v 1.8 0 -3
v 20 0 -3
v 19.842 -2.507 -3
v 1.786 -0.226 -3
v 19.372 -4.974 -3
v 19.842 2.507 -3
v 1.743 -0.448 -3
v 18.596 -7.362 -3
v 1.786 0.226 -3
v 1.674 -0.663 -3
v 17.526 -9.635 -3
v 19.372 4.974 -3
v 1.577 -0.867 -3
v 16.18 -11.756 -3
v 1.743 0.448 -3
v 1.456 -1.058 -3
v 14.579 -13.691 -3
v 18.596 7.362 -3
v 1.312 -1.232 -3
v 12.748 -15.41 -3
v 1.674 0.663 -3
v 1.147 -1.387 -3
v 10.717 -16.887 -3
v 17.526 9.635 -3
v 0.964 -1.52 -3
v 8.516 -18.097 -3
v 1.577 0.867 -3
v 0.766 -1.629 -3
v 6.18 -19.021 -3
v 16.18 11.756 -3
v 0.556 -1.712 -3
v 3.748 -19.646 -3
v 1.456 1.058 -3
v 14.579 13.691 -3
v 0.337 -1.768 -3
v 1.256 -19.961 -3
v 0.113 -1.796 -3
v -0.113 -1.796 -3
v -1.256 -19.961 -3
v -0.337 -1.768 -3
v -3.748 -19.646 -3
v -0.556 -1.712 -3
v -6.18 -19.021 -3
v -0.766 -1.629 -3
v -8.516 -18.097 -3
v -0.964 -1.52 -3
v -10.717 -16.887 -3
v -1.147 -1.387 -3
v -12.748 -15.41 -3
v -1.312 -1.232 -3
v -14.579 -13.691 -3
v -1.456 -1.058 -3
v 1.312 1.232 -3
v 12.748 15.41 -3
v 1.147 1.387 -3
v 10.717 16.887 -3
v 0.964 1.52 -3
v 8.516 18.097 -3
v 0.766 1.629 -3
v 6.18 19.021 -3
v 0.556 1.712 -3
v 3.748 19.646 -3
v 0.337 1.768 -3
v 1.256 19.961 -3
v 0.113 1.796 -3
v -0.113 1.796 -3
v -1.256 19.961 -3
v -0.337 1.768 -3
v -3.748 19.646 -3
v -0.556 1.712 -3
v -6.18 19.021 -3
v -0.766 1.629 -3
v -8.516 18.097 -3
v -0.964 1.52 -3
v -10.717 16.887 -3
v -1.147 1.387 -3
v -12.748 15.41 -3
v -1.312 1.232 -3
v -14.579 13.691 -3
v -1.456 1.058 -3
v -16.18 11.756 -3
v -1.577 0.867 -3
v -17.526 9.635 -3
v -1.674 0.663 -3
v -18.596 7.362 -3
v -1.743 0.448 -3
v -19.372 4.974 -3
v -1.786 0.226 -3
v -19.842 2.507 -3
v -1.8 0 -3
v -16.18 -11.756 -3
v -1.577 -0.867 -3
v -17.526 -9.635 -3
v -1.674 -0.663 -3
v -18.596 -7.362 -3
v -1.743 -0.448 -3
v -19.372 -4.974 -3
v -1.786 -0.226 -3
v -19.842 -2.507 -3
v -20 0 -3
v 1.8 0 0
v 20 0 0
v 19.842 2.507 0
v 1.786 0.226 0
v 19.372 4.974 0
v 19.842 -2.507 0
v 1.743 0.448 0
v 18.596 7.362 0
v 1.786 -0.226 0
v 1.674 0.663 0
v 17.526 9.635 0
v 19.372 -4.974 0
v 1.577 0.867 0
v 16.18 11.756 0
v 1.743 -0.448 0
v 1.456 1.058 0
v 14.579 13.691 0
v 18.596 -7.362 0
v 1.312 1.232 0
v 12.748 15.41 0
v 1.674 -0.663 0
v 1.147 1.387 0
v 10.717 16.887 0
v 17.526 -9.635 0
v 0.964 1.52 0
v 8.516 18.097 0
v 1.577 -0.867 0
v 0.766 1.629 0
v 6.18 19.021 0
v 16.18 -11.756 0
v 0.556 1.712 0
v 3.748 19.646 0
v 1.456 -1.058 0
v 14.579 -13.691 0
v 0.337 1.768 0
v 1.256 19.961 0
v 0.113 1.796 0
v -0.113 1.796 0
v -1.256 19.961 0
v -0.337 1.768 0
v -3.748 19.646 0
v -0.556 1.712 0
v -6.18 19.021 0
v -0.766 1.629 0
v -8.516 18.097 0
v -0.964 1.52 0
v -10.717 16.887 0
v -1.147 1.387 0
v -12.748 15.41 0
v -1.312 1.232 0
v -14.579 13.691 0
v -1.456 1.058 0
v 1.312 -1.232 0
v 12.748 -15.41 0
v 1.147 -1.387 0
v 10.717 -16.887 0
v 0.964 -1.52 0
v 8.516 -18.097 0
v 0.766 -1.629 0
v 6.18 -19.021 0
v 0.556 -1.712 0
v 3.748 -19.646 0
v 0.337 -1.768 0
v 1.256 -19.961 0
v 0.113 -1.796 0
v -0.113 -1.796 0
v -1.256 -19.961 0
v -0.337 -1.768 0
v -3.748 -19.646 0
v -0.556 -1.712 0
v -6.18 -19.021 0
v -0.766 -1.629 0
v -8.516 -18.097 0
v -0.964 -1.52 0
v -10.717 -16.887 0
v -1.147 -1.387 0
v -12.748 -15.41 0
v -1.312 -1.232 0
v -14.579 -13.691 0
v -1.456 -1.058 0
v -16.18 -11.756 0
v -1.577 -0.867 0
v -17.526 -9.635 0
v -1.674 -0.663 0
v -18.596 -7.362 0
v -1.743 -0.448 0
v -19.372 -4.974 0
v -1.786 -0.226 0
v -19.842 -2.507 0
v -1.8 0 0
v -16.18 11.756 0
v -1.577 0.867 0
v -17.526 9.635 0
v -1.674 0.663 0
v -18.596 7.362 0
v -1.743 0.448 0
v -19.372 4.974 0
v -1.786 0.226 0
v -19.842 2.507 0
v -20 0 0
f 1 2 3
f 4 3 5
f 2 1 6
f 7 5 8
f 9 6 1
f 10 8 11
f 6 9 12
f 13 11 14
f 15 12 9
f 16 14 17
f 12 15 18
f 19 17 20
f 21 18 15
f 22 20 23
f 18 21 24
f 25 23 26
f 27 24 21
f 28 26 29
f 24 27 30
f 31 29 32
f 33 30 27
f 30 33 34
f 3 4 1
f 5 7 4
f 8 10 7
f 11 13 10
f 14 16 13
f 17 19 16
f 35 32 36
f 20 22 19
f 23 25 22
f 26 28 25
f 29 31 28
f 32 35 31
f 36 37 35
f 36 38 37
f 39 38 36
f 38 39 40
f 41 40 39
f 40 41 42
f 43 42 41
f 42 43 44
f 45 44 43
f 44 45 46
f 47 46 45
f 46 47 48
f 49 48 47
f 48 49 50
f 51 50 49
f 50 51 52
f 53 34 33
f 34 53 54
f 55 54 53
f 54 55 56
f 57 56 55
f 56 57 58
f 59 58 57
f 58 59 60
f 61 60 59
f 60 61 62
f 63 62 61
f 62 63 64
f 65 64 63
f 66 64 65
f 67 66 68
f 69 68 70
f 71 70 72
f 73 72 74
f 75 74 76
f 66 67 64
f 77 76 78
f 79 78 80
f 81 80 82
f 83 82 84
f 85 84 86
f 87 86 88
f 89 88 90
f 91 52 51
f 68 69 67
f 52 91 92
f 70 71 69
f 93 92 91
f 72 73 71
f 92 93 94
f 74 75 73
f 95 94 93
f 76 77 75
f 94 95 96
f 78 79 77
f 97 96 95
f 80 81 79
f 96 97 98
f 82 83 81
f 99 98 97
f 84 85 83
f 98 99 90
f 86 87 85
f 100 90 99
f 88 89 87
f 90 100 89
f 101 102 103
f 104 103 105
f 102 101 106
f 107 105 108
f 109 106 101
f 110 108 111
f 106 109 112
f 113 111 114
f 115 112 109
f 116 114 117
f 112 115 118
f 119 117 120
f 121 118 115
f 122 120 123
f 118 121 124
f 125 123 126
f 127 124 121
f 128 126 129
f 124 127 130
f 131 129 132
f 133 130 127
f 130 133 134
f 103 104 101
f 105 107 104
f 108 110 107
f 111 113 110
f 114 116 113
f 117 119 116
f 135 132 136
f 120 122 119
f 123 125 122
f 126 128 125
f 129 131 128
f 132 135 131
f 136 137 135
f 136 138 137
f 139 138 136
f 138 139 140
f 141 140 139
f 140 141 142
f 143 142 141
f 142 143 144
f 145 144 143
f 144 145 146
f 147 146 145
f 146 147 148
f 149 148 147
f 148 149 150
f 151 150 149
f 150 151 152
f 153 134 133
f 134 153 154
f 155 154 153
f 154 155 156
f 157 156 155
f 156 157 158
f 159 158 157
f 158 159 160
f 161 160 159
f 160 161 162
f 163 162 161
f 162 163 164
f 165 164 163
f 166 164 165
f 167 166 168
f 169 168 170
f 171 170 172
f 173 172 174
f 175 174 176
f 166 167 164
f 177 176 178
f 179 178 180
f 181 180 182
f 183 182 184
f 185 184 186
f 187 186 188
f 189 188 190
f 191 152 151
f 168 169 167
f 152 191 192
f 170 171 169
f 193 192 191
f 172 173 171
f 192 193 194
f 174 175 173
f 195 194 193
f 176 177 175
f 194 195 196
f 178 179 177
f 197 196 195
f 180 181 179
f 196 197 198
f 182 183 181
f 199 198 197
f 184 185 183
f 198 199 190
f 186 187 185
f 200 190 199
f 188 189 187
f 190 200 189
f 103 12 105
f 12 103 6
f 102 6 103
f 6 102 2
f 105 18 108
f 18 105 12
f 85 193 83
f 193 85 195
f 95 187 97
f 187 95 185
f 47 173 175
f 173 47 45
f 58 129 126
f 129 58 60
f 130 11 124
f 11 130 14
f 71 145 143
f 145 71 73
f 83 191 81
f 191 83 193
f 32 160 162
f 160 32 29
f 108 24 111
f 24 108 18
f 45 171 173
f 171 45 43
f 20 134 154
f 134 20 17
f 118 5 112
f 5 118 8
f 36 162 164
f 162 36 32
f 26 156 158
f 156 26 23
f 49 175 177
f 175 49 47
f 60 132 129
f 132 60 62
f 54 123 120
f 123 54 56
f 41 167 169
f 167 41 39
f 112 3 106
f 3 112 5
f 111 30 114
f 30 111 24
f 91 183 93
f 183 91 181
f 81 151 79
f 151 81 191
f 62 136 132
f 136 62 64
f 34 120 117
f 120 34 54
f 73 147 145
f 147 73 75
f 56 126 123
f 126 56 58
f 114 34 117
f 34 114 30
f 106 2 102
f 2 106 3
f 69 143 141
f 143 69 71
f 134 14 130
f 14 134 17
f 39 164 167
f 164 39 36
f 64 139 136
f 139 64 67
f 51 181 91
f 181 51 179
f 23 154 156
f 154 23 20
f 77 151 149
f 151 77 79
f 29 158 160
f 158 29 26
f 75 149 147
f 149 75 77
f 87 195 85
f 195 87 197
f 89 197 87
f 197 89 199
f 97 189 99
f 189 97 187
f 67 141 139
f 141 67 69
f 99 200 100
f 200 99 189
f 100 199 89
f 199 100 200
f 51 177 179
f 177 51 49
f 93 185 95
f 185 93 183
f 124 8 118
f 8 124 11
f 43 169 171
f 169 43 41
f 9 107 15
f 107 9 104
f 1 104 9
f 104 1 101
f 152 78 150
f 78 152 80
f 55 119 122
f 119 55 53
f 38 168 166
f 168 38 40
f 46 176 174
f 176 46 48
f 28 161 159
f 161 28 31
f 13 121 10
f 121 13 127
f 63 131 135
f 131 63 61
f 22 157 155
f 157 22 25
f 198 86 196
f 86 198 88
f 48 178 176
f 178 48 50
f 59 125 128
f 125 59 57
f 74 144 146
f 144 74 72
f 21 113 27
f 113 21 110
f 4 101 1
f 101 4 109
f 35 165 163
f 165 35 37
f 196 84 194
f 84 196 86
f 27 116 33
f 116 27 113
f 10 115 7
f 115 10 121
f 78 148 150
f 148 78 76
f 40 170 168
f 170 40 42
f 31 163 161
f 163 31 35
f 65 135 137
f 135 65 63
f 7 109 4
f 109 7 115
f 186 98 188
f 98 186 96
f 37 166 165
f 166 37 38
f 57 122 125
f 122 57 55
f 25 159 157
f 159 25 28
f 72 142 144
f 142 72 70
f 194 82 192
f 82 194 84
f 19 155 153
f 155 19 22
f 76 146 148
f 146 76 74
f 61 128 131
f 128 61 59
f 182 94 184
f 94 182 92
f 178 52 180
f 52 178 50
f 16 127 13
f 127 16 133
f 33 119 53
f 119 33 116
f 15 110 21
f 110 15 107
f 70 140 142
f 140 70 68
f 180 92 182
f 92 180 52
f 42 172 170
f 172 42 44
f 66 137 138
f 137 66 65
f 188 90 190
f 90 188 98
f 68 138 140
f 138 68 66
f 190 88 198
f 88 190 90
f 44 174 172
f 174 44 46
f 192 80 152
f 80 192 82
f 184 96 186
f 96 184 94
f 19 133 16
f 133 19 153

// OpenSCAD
$fn = 50;


difference() {
	union() {
		translate(v = [0, 0, -3.0000000000]) {
			cylinder(h = 3, r = 10.0000000000);
		}
		translate(v = [0, 0, -3.0000000000]) {
			cylinder(h = 3, r = 20.0000000000);
		}
	}
	union() {
		#translate(v = [0, 0, -3]) {
			cylinder(h = 3, r = 1.8000000000);
		}
	}
}
